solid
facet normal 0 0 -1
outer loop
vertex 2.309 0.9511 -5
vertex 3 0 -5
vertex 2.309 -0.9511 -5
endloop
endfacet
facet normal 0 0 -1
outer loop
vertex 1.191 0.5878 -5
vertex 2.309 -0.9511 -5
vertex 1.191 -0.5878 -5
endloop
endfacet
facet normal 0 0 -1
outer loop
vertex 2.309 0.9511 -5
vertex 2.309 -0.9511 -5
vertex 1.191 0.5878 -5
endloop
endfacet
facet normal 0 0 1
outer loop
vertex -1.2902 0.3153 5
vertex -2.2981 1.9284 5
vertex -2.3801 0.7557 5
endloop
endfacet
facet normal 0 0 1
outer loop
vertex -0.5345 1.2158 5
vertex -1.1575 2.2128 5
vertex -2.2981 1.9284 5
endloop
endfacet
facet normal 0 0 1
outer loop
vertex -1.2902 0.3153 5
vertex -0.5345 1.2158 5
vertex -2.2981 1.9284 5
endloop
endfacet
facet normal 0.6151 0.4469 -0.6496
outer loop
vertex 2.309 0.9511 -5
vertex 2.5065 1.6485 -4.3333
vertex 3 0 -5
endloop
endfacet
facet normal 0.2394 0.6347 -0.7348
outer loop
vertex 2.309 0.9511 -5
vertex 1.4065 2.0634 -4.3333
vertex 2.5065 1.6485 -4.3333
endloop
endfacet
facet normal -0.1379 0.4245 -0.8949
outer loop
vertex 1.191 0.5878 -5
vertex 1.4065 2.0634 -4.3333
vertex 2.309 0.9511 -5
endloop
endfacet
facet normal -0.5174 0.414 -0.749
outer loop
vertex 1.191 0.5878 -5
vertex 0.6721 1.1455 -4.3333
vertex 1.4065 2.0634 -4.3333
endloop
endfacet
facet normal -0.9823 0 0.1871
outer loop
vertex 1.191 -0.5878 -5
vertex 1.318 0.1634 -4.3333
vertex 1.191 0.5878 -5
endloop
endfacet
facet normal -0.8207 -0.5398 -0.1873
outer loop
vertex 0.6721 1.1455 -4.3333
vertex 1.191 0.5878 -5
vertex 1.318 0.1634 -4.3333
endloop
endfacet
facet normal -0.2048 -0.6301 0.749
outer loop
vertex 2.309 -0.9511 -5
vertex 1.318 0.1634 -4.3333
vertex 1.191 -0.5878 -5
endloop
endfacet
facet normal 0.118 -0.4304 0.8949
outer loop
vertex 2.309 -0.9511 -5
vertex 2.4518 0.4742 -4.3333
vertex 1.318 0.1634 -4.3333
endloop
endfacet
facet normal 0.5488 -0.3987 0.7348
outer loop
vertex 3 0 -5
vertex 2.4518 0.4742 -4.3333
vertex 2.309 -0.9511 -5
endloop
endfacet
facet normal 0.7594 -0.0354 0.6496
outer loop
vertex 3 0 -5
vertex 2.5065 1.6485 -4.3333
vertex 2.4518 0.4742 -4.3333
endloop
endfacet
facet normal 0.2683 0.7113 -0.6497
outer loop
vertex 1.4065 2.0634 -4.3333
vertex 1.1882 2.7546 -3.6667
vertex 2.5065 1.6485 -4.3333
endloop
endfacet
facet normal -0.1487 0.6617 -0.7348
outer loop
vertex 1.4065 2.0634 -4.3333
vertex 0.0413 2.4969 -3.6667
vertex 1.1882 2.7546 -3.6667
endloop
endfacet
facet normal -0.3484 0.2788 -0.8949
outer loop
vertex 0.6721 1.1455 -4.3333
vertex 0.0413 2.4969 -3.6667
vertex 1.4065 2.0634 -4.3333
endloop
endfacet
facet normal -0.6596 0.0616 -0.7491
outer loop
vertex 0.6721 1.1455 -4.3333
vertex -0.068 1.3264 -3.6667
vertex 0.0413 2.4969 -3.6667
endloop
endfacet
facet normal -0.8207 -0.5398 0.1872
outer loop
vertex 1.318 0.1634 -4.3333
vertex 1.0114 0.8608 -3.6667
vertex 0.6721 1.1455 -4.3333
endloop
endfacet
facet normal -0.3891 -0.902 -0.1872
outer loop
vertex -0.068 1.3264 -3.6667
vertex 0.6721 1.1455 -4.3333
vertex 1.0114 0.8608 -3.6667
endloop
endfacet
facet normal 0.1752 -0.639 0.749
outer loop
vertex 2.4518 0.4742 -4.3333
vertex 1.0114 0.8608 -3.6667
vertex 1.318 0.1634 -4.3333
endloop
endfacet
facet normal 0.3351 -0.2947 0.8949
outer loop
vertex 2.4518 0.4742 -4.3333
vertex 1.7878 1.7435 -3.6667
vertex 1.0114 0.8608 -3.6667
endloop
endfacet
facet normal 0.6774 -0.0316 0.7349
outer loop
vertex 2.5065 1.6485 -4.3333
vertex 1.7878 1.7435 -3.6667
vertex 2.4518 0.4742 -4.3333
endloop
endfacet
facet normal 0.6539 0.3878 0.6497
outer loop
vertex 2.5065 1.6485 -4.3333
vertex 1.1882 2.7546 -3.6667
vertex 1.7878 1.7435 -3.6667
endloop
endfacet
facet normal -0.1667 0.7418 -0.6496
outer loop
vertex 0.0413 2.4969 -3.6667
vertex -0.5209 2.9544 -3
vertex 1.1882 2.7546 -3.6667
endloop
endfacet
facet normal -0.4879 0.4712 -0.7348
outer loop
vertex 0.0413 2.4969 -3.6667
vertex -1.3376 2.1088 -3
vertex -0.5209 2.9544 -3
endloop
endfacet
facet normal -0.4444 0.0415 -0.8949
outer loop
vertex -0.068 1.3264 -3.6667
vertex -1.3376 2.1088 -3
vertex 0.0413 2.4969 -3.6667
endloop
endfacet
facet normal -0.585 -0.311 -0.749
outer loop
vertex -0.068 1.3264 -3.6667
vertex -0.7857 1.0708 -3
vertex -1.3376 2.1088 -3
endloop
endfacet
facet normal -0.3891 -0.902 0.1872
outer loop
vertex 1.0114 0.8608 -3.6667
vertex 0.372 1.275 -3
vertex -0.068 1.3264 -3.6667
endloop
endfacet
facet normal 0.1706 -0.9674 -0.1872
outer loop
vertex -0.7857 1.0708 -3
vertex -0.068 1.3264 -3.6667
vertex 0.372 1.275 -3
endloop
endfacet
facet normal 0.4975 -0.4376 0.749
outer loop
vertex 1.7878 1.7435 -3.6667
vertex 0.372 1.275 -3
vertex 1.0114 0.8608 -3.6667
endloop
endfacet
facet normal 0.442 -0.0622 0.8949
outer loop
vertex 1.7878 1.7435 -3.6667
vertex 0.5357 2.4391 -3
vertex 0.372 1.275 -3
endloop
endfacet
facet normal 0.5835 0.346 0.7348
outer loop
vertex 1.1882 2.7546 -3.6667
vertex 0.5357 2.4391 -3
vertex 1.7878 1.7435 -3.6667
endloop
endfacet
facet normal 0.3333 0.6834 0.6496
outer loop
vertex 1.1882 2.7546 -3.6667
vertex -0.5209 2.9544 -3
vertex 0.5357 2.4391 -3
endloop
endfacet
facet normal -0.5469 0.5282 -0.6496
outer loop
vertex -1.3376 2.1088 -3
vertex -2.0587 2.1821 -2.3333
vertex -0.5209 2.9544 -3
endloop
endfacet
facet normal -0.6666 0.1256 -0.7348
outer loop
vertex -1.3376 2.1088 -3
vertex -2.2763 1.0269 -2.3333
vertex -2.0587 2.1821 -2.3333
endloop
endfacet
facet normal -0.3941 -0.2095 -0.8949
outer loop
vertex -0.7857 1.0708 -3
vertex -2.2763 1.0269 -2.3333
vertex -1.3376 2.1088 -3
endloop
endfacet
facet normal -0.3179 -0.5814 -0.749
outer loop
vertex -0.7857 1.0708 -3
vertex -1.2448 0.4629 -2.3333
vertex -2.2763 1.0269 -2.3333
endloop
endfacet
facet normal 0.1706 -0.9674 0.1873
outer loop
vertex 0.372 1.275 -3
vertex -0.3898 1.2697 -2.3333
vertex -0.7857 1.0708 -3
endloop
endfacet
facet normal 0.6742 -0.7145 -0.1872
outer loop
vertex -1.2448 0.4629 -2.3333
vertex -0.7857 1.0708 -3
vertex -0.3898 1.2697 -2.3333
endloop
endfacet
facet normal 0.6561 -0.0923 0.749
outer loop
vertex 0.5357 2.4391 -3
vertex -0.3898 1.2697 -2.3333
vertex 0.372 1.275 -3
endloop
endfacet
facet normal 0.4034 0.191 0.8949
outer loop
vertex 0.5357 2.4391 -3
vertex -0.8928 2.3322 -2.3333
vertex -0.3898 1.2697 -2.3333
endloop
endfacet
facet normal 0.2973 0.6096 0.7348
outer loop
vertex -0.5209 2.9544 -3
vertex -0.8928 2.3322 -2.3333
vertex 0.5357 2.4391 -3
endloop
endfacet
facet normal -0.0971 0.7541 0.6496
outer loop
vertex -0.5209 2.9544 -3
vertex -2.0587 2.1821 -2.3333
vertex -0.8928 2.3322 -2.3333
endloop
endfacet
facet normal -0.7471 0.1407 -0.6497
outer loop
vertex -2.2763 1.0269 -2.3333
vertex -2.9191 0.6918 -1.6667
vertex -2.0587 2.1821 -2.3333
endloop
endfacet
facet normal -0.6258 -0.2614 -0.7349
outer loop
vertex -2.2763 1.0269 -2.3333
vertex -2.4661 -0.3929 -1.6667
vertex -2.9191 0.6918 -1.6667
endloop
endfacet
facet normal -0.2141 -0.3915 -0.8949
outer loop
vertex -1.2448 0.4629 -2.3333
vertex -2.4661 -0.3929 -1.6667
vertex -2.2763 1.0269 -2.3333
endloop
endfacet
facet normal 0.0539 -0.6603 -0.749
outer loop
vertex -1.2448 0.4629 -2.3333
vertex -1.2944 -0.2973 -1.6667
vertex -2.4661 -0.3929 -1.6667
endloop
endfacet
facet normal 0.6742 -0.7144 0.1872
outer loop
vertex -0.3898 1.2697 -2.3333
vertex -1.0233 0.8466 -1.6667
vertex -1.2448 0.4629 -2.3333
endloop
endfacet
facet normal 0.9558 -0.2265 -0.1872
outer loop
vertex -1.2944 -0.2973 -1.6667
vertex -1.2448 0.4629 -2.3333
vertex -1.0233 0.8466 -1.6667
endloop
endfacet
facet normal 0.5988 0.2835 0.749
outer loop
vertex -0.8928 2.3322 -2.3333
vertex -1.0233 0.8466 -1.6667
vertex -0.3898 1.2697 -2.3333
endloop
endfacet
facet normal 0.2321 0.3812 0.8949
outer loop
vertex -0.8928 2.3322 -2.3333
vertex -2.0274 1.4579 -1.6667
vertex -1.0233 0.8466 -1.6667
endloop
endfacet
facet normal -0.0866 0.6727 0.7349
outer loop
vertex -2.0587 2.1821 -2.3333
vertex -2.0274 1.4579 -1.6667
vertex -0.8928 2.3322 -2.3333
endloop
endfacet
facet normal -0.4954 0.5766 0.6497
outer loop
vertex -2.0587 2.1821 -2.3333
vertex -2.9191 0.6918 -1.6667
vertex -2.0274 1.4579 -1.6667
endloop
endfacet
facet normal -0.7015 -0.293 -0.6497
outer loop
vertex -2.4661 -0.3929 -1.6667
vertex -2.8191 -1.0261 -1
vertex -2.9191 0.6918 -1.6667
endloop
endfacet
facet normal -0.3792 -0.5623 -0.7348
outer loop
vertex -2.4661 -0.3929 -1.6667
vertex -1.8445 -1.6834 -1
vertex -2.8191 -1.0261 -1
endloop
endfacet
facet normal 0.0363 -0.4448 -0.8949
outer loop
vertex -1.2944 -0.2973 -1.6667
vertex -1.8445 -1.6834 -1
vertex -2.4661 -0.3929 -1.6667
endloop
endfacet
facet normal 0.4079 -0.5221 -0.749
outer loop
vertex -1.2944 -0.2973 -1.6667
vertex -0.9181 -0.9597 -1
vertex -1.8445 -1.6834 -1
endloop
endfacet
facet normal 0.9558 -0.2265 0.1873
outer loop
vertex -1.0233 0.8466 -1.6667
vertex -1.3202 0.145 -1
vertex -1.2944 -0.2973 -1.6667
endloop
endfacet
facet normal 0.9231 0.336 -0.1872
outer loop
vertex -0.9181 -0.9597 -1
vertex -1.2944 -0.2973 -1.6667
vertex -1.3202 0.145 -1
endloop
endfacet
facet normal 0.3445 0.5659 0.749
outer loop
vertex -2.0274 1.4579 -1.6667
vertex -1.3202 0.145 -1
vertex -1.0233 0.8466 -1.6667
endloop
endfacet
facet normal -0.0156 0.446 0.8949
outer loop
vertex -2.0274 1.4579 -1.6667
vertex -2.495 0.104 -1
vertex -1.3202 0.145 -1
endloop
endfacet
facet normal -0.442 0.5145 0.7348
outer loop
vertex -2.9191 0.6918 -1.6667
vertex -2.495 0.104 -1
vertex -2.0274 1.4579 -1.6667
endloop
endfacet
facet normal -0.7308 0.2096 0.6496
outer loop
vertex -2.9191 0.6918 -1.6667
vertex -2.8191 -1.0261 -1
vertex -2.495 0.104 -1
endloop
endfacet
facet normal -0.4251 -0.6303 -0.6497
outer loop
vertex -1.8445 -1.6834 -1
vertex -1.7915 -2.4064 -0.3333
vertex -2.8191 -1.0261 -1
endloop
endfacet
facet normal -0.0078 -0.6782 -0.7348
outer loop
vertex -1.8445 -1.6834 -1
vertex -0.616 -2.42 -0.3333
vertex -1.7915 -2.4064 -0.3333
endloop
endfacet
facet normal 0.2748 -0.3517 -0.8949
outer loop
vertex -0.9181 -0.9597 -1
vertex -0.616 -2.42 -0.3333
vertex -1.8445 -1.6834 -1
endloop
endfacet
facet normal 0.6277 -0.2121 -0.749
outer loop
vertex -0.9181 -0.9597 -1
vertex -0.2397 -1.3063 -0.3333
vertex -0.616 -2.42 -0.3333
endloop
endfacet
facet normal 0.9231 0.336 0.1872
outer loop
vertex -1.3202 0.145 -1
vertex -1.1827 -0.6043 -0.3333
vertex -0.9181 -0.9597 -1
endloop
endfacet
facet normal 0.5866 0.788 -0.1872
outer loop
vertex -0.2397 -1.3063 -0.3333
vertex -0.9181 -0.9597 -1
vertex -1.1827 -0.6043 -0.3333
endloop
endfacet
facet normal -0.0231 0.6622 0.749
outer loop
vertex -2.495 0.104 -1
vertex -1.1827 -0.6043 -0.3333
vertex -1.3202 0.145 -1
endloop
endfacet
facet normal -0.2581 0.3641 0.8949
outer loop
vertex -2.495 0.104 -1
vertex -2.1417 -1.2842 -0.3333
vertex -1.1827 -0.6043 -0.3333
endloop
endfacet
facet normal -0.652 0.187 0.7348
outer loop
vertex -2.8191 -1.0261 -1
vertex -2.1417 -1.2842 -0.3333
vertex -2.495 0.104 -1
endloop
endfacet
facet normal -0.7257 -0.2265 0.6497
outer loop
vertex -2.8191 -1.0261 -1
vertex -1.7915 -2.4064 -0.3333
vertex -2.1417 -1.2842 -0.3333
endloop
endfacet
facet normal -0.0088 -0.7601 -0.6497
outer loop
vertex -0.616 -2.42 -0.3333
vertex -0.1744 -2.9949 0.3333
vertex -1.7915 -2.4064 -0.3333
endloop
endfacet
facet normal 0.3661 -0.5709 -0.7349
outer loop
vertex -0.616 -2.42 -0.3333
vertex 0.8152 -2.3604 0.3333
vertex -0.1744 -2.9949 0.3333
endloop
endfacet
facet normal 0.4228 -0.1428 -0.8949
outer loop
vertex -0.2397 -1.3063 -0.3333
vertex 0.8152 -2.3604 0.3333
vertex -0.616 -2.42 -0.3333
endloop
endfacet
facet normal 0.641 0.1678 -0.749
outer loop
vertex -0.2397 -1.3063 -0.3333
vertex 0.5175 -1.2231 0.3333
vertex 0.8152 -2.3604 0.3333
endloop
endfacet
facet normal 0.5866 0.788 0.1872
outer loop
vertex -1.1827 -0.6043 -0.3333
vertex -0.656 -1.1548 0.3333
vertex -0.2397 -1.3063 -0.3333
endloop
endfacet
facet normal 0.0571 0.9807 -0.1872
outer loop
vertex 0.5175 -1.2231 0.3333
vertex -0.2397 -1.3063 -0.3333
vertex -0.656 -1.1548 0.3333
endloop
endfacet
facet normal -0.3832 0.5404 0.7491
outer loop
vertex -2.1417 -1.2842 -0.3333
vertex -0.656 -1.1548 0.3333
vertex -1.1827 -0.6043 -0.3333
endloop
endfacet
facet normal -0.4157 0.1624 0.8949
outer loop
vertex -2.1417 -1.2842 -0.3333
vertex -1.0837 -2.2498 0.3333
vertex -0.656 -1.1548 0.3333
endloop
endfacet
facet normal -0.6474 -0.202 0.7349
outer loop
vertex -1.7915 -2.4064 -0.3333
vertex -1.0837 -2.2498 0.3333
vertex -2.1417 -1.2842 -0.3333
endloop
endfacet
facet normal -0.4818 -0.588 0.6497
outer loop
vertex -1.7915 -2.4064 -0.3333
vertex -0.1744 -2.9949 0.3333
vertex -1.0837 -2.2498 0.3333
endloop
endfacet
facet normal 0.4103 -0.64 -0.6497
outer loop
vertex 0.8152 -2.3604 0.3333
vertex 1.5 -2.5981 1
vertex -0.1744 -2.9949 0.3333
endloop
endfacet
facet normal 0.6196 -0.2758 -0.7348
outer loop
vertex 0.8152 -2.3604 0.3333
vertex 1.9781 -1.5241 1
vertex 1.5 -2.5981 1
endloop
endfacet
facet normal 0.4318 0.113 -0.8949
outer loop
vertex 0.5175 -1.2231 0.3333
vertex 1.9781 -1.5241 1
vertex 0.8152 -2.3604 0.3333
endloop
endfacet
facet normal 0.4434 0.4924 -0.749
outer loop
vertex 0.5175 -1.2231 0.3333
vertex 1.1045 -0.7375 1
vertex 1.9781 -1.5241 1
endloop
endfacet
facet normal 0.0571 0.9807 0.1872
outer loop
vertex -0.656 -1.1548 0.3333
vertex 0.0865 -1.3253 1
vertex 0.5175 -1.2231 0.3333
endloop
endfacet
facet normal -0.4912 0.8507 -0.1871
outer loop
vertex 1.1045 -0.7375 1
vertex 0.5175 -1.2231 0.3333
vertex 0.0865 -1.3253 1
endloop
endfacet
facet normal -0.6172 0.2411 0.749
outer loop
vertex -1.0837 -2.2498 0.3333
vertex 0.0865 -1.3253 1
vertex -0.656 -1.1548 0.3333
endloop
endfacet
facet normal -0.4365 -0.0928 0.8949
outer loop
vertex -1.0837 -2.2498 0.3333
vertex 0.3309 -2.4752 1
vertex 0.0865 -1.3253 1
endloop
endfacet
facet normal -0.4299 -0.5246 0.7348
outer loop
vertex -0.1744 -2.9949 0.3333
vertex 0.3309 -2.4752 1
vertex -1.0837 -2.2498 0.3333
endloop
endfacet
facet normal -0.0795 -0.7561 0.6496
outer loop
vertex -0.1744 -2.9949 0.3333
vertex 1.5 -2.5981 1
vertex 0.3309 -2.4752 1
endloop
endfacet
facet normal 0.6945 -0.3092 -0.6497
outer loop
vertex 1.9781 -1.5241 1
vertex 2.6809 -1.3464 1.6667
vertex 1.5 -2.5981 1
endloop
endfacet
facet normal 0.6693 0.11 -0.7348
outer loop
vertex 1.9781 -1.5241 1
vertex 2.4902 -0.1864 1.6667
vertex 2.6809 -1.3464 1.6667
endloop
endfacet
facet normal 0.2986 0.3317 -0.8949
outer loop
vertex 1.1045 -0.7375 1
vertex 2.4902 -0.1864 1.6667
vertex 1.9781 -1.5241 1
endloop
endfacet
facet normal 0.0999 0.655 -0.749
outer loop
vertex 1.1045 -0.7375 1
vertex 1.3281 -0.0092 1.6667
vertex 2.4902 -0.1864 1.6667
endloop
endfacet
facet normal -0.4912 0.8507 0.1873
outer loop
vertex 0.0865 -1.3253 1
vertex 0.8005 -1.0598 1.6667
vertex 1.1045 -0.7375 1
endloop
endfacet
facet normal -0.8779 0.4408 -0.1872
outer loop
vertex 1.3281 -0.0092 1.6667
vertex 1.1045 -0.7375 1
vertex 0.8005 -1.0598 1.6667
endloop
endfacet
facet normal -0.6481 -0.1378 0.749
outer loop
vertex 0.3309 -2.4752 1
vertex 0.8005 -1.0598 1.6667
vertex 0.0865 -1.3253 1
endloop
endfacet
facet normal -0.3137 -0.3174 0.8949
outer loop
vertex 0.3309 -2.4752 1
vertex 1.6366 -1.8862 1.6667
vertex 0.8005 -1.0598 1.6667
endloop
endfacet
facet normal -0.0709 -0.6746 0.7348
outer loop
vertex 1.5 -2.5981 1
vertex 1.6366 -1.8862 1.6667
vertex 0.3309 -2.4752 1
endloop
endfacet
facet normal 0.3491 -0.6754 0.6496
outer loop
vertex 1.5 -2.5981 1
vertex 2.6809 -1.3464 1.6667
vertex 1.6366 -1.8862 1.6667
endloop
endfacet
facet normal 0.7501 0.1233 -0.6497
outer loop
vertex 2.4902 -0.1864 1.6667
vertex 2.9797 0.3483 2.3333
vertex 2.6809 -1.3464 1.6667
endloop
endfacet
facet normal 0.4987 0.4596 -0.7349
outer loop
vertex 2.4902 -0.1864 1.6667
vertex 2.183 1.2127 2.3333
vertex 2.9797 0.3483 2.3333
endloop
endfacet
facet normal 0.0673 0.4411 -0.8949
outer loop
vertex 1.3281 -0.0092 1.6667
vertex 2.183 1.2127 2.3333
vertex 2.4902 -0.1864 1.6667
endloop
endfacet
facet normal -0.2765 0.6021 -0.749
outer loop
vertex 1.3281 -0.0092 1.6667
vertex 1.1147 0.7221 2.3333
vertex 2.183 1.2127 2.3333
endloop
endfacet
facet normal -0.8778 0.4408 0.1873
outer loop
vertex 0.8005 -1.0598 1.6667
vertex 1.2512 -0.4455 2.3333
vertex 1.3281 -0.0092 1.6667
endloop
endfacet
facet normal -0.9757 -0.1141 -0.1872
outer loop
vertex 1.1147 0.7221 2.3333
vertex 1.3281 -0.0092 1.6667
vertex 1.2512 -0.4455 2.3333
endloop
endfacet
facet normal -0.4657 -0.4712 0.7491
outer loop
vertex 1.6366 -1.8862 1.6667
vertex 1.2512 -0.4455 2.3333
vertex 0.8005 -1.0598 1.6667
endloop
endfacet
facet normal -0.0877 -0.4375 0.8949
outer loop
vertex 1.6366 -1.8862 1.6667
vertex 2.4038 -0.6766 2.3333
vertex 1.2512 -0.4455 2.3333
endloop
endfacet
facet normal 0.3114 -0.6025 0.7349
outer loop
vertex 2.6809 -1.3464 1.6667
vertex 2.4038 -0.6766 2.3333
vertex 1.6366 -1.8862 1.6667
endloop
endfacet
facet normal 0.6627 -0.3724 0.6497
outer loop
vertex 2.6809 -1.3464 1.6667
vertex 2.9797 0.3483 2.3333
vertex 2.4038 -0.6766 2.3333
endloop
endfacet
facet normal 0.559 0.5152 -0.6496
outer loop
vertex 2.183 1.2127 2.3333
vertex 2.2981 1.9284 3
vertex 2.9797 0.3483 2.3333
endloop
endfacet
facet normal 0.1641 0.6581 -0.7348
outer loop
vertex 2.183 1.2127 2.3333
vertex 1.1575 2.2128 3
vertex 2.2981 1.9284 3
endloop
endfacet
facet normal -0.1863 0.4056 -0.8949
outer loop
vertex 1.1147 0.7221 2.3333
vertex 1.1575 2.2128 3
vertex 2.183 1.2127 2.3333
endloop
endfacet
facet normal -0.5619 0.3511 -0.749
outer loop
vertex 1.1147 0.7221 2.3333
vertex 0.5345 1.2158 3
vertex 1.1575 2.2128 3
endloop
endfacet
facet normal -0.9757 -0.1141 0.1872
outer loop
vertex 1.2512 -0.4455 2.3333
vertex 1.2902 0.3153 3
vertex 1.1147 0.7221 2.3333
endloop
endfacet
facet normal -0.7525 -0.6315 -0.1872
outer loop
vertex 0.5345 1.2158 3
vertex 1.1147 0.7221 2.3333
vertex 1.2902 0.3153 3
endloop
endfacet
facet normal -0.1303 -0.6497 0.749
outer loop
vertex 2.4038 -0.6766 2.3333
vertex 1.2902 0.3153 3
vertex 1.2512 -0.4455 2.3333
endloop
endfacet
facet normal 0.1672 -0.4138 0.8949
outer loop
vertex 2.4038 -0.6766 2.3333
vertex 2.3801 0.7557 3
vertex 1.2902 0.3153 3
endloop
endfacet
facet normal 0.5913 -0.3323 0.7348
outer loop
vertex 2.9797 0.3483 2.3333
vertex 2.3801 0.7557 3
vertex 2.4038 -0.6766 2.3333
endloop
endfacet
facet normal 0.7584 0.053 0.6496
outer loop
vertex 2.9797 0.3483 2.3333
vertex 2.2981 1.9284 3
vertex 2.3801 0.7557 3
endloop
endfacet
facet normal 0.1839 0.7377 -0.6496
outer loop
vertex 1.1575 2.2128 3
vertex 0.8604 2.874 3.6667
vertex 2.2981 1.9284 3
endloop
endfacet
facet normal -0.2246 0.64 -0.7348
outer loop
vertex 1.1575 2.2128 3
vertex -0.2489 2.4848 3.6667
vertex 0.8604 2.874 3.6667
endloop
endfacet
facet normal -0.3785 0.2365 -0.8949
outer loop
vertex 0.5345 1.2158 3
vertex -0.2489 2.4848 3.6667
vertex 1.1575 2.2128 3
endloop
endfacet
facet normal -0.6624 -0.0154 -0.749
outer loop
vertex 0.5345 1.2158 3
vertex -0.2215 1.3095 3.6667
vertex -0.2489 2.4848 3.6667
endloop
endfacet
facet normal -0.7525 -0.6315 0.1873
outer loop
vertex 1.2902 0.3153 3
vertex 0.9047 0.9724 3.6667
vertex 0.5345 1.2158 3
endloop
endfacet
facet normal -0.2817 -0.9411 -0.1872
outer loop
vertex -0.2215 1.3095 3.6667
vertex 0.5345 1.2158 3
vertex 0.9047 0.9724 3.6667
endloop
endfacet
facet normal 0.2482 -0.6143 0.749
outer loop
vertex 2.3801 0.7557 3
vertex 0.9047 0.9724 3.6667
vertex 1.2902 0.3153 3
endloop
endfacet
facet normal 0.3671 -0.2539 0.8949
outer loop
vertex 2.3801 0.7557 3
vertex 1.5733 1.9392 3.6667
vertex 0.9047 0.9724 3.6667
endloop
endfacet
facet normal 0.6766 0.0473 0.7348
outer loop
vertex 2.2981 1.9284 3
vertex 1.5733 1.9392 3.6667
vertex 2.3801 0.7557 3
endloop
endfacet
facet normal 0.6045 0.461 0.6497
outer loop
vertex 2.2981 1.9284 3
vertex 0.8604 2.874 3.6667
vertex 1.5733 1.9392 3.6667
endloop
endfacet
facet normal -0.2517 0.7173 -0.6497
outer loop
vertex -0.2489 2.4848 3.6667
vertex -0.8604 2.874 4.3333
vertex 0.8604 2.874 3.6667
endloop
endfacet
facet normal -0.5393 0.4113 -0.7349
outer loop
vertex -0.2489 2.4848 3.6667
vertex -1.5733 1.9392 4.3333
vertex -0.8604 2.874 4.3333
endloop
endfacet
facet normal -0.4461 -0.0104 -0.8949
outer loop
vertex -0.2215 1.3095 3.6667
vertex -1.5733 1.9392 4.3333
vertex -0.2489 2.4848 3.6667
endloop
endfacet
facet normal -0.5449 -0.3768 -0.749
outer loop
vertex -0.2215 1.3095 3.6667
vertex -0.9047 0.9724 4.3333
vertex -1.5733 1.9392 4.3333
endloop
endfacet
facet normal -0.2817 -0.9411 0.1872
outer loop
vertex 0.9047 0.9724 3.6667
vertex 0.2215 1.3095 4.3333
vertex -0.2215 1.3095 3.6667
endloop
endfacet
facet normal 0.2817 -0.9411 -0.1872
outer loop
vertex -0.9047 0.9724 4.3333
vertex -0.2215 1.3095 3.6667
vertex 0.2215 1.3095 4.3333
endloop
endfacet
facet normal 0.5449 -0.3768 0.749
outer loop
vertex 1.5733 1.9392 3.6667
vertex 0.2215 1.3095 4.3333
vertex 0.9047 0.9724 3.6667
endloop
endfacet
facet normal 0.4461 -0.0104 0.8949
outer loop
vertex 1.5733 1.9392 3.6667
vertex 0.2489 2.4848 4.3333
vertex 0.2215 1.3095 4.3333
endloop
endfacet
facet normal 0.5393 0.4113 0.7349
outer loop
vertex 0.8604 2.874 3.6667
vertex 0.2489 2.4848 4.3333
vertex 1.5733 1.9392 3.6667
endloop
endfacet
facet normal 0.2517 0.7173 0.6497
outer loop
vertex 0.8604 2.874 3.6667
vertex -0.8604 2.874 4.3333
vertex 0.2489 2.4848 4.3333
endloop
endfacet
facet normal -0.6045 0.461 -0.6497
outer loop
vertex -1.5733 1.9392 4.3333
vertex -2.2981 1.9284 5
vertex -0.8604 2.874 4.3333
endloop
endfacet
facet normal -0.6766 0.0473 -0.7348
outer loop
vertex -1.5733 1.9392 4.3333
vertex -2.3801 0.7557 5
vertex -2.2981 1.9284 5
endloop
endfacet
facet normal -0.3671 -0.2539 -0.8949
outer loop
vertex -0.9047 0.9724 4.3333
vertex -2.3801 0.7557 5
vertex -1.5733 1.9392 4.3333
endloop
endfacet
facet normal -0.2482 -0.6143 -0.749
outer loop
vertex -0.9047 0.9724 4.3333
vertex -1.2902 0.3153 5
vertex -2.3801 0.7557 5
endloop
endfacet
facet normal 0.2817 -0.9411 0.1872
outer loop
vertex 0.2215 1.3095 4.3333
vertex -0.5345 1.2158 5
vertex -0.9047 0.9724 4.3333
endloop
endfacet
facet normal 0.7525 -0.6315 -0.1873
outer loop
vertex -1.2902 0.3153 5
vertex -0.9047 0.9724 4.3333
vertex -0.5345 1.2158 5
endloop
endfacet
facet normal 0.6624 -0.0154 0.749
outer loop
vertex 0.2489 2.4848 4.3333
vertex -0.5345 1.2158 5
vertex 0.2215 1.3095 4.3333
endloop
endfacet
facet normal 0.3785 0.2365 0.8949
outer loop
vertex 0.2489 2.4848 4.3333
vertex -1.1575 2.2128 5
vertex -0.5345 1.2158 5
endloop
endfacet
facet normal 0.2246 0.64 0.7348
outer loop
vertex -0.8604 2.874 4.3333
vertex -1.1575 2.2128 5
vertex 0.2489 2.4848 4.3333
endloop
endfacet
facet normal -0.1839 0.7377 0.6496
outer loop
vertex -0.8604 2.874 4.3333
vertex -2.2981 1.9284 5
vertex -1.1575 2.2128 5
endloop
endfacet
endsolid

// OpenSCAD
linear_extrude(height = 10, center = true, convexity = 10, twist = -500)
translate([2, 0, 0])
circle(r = 1);
